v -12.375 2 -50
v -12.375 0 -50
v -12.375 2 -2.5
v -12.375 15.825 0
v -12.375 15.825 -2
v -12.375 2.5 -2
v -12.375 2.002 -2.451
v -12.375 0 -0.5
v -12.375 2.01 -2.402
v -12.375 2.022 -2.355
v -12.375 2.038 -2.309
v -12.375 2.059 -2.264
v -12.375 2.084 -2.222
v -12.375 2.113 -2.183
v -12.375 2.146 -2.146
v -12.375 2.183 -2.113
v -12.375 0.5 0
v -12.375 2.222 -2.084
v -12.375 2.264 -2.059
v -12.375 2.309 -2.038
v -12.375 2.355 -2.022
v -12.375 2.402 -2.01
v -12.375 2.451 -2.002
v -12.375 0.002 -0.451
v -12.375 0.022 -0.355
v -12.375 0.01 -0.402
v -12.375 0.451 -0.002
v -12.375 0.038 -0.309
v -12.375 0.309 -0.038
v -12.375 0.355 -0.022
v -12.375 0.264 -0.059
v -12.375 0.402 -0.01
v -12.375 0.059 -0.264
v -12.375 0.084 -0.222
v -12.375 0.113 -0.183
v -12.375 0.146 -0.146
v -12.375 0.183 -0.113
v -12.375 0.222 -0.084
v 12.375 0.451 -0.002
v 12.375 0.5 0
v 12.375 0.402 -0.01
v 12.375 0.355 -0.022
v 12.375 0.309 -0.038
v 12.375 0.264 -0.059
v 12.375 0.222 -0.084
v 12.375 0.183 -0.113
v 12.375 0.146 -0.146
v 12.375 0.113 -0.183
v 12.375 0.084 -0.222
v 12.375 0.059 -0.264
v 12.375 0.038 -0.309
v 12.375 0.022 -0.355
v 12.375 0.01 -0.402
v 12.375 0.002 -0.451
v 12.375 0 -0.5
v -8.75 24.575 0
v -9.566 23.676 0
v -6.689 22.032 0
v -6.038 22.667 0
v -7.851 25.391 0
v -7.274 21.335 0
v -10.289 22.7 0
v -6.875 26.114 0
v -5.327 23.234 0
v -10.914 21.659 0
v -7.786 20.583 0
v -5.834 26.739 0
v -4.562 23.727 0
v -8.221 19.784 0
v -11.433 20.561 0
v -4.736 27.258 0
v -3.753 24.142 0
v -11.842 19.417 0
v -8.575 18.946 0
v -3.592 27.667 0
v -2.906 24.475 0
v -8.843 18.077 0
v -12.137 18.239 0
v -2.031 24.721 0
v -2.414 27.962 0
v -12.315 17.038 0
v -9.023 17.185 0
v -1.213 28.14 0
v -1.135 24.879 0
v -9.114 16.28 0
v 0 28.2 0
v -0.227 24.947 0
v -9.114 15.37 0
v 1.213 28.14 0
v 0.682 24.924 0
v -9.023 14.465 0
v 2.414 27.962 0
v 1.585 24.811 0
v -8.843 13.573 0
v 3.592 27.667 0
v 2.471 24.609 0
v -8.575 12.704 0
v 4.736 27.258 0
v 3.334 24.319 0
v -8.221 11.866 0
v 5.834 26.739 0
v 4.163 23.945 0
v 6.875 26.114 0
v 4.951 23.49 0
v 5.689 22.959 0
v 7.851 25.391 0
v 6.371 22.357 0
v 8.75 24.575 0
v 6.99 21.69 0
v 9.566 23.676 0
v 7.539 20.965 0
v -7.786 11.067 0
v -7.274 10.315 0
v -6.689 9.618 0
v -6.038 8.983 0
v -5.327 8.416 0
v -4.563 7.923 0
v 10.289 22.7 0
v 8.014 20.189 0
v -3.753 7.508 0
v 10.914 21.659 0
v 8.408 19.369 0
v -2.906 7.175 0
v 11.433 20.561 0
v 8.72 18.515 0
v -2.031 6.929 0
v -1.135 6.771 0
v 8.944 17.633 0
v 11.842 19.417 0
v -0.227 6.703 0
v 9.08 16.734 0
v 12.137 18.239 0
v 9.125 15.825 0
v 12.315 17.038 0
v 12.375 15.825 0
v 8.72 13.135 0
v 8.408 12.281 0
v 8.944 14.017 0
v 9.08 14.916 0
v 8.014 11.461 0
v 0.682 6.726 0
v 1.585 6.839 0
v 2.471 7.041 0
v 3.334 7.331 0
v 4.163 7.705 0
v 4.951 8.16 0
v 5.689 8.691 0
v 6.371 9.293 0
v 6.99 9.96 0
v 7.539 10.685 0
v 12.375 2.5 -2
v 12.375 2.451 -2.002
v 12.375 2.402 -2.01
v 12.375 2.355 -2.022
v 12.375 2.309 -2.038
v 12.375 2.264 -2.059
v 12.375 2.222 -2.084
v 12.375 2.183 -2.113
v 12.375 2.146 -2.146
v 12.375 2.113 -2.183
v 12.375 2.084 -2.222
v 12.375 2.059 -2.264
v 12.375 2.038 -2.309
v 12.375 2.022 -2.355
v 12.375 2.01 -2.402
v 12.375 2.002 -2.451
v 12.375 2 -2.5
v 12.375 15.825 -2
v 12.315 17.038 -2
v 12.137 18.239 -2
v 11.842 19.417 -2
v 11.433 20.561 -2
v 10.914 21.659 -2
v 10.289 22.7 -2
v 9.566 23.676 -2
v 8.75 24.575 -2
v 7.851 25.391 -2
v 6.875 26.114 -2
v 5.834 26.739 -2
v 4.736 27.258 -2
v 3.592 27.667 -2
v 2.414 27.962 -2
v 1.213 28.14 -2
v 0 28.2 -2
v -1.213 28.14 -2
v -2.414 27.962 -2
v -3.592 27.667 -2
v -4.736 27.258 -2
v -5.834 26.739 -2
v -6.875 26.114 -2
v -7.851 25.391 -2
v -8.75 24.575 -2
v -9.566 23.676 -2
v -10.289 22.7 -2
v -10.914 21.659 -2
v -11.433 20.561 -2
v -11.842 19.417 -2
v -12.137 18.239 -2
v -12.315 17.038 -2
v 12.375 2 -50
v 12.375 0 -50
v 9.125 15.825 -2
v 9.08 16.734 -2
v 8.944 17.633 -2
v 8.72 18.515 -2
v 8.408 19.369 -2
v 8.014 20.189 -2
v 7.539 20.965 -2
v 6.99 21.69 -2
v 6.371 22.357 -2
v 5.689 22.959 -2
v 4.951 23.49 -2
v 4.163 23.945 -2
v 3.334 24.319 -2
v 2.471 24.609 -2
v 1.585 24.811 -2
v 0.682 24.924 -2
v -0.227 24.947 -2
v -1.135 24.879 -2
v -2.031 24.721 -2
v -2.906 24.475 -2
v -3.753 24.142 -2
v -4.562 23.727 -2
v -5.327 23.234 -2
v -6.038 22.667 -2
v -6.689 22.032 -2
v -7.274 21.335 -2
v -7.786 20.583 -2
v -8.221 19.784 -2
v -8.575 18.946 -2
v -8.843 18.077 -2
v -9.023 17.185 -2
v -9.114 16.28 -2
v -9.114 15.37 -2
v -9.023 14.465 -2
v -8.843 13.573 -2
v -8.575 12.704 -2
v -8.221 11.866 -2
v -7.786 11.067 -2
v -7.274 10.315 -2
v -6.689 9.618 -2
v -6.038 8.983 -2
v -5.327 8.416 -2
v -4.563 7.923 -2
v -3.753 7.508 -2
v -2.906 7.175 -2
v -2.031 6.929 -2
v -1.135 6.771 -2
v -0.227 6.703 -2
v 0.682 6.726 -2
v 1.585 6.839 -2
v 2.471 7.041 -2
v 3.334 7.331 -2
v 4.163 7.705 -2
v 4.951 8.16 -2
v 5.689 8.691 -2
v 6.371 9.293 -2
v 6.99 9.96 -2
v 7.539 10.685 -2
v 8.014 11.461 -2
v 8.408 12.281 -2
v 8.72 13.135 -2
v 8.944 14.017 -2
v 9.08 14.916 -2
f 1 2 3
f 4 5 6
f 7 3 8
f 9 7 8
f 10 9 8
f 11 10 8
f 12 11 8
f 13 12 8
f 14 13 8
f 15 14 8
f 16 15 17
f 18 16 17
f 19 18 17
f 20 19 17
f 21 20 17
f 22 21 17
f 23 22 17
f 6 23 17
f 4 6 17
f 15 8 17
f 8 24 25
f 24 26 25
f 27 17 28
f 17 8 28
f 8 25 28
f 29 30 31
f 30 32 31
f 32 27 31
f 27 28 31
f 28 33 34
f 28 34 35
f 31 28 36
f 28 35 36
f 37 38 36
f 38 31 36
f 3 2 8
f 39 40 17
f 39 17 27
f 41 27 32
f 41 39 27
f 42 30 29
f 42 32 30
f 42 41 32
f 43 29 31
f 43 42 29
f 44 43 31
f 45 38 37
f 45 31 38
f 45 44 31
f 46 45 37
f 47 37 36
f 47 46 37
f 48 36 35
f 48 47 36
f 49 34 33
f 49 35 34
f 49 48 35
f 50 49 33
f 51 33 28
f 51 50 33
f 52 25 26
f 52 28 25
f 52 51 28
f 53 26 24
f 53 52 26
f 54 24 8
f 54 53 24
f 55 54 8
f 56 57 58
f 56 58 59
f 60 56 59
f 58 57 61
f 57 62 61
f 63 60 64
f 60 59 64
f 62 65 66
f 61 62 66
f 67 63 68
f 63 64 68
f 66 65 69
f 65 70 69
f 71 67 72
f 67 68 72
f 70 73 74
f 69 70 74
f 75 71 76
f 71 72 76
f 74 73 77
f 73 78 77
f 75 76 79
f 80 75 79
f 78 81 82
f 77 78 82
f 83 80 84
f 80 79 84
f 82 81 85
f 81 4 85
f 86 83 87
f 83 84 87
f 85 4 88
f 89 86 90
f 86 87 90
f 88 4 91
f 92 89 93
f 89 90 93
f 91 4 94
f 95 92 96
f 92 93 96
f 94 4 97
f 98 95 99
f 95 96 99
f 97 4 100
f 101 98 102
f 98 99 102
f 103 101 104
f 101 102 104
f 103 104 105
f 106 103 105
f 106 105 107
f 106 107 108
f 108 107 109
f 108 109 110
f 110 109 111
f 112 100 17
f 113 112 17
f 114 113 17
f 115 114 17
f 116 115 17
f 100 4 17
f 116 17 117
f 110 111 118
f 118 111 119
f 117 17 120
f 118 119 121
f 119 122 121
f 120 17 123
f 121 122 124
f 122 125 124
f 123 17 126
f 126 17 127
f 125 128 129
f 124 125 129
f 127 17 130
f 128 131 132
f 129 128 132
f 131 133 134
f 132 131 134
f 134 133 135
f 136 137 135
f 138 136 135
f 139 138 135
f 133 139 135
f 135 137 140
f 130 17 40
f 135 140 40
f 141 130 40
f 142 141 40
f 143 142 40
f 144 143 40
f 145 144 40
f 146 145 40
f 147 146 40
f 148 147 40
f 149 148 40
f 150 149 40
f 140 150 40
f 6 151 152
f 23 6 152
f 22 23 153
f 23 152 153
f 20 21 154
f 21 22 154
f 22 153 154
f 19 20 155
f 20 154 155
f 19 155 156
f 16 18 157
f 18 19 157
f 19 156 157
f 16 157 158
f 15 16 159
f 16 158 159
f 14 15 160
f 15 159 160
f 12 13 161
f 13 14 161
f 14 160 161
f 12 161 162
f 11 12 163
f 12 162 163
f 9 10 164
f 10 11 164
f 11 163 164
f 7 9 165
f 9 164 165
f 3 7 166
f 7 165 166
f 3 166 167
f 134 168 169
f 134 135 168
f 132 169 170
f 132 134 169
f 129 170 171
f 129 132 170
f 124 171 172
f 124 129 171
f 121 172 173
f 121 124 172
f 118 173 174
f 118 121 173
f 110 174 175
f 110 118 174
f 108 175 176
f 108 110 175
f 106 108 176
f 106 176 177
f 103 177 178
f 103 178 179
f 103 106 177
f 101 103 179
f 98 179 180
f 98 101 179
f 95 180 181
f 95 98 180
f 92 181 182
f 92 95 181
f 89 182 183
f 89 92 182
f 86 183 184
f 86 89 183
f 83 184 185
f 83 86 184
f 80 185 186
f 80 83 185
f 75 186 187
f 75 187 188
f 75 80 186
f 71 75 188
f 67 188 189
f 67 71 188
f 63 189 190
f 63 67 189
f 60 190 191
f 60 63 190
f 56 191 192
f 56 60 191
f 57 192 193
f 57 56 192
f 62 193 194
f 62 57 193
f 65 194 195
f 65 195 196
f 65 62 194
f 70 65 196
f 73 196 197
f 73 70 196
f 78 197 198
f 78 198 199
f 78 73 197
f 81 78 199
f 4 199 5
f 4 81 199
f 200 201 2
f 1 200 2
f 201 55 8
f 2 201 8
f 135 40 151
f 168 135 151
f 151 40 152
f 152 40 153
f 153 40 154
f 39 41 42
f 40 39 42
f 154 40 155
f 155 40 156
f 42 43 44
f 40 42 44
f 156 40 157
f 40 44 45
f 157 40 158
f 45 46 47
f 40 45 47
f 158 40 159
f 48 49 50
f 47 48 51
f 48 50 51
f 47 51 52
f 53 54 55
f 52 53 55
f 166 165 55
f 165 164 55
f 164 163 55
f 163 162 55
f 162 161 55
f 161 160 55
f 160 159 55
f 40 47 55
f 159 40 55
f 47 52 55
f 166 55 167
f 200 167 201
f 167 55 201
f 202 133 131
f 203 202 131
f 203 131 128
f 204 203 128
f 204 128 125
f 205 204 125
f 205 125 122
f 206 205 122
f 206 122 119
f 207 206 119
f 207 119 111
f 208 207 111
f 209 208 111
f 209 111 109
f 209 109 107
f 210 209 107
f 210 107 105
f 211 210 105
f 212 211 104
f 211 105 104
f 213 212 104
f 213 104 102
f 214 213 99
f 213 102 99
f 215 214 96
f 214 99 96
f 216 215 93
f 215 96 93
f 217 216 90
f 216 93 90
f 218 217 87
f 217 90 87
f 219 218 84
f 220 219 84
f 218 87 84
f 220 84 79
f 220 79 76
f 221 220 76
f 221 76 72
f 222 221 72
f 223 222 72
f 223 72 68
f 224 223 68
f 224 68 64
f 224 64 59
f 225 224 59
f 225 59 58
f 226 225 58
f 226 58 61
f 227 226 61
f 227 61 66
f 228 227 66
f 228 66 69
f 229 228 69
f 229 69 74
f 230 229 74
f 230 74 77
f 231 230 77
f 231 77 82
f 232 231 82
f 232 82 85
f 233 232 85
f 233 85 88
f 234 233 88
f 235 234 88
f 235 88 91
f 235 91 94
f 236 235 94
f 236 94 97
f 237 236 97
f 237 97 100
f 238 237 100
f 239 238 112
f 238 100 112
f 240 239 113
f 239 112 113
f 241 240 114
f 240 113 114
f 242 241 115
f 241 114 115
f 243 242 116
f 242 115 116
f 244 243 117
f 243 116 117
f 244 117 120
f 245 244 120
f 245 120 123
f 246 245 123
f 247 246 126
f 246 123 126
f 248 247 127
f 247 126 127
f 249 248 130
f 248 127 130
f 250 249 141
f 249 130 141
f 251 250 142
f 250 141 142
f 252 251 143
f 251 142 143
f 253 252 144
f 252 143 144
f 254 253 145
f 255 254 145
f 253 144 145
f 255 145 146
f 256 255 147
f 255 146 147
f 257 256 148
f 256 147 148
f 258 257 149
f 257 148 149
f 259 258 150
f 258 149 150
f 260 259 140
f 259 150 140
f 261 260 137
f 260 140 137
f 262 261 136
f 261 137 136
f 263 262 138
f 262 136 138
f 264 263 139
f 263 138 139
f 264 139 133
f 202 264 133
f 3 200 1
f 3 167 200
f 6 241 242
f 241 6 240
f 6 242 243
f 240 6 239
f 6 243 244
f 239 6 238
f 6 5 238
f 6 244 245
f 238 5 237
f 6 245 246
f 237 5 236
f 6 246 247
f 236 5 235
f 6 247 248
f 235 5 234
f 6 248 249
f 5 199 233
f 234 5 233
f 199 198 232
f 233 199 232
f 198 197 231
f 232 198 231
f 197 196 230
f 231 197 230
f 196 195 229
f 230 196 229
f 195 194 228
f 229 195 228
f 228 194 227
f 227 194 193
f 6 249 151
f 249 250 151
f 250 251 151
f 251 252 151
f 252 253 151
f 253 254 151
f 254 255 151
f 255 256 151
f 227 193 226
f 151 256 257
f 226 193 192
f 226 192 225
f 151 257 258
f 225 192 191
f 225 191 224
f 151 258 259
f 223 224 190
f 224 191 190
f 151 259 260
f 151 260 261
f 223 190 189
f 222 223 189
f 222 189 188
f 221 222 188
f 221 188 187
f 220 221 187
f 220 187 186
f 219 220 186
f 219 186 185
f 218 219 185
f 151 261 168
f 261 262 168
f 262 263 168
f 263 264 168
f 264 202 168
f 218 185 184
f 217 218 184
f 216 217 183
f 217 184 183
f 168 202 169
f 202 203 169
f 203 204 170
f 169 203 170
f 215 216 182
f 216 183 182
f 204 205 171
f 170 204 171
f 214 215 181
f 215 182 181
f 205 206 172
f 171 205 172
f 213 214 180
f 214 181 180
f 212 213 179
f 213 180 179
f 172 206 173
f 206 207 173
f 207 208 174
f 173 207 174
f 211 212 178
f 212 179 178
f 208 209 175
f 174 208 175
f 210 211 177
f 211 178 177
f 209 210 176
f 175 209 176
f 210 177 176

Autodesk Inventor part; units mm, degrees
ref_plane "YZ Plane" through (0, 0, 0) normal (1, 0, 0) x (0, 1, 0)
ref_plane "XZ Plane" through (0, 0, 0) normal (0, 1, 0) x (-1, 0, 0)
ref_plane "XY Plane" through (0, 0, 0) normal (0, 0, 1) x (1, 0, 0)
sketch "Sketch1" plane through (0, 0, 0) normal (0, 0, 1) x (1, 0, 0)
  circle A0 centre (0, 15.825) radius 9.125
  line L0 (-12.375, 0) -> (12.375, 0)
  arc A1 (12.375, 15.825) -> (-12.375, 15.825) centre (0, 15.825) ccw
  line L1 (12.375, 0) -> (12.375, 15.825)
  line L2 (-12.375, 0) -> (-12.375, 15.825)
  point P0 (0, 0)
  point P1 (0, 0)
  point P2 (0, 0)
  point P3 (0, 3.45)
  dimension "d28" = 18.25
  dimension "d29" = 24.75
  dimension "d30" = 24.75
  dimension "d31" = 3.45
sketch "Sketch2" plane through (0, 0, 0) normal (0, 1, 0) x (-1, 0, 0)
  line L0 (12.375, 0) -> (-12.375, 0)
  line L1 (-12.375, 0) -> (-12.375, -50)
  line L2 (-12.375, -50) -> (12.375, -50)
  line L3 (12.375, -50) -> (12.375, 0)
  point P0 (0, 0)
  point P1 (-12.375, 0)
  dimension "d5" = 24.75
  dimension "d10" = 50
extrude "Extrusion4" add sketch "Sketch2" along normal blind 2
extrude "Extrusion5" add sketch "Sketch1" against normal blind 2
fillet "Fillet1" radius 0.5 2 edges at (0, 0, 0) (0, 2, -2)
properties part number "Dudukan Proximity V2"
